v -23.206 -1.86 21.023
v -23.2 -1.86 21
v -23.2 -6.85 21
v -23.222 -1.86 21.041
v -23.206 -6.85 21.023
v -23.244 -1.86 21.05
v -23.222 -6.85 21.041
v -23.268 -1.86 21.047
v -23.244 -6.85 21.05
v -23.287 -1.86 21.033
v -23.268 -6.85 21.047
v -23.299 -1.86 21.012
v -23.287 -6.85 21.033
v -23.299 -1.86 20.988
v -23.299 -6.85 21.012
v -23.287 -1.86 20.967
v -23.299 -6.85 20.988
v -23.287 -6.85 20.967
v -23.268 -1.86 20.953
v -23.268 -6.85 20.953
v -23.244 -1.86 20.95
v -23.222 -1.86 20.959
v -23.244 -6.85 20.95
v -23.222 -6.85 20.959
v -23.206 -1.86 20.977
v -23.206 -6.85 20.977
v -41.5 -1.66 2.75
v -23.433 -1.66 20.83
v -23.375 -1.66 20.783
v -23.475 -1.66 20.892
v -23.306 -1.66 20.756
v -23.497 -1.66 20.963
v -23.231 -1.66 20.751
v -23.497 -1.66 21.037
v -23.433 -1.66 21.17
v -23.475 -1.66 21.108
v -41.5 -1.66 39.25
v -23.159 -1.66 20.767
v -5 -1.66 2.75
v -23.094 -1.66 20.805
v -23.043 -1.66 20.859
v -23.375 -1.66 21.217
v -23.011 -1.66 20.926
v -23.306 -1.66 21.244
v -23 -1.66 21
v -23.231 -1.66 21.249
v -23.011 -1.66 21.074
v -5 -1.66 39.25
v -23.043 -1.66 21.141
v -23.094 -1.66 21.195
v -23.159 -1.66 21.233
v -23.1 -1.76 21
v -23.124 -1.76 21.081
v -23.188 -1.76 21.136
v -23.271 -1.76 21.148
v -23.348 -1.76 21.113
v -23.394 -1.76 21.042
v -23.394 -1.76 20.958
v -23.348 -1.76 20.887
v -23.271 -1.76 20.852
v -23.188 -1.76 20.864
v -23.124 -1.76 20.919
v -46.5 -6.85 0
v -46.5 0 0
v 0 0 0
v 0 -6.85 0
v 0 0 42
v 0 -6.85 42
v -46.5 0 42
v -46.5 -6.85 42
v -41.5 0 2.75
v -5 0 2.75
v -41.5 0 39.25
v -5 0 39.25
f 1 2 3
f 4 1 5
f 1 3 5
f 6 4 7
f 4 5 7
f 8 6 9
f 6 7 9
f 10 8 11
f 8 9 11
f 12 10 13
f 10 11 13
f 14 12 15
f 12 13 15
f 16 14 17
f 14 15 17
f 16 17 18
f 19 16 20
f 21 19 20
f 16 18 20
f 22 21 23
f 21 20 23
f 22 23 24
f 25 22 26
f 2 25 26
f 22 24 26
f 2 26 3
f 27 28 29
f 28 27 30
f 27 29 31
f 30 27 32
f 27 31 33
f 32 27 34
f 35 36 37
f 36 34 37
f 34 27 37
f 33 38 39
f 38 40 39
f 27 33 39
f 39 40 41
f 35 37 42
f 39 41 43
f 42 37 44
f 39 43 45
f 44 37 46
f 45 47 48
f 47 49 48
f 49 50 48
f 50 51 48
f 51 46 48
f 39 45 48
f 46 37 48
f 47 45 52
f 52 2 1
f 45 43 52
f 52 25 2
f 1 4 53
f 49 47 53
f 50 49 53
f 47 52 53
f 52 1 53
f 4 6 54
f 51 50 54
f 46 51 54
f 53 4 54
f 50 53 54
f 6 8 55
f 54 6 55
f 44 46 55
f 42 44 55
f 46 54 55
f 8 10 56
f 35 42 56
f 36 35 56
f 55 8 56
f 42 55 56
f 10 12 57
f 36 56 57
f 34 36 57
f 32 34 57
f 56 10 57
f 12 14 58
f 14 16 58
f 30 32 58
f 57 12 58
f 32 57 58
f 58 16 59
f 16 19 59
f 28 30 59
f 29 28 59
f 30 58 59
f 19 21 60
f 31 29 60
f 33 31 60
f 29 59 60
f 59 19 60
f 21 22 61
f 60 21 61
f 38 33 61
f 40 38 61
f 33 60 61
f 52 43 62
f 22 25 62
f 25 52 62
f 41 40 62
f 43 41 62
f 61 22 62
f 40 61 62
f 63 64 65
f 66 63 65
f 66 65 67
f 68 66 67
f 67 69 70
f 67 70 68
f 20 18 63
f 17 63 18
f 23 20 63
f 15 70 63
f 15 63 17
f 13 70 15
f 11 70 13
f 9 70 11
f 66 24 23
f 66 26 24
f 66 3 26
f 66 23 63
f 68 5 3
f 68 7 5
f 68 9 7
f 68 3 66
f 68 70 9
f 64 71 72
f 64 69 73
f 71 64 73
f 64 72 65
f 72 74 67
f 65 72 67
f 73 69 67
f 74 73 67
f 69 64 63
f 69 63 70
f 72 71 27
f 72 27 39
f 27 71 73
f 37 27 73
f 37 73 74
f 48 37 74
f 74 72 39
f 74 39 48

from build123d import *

# Parameters (mm, degrees)
F0_W           = 46.5
F0_H           = 42
F0_W_2         = 36.5
F0_H_2         = 36.5
F1_DEPTH       = 6.85
F2_DEPTH       = 1.66
F4_D           = 0.1
F4_CSINK_D     = 0.5
F4_CSINK_ANGLE = 90


with BuildPart() as f1:
    # F0 (on Front) → F1 (new body)
    with BuildSketch(Plane.XZ):
        with Locations((-23.25, 21)):
            Rectangle(F0_W, F0_H)
        with Locations((-23.25, 21)):
            Rectangle(F0_W_2, F0_H_2, mode=Mode.SUBTRACT)
        with Locations((-23.25, 21)):
            Rectangle(F0_W_2, F0_H_2)
    extrude(amount=F1_DEPTH)

    # F0 (on Front) → F2 (cut)
    with BuildSketch(Plane.XZ):
        with Locations((-23.25, 21)):
            Rectangle(F0_W_2, F0_H_2)
    extrude(amount=F2_DEPTH, mode=Mode.SUBTRACT)

    # F4 (through all)
    with Locations(Plane(origin=(0, -1.66, 0), x_dir=(-1, 0, 0), z_dir=(0, 1, 0))):
        with Locations((23.25, 21)):
            CounterSinkHole(F4_D / 2, F4_CSINK_D / 2, counter_sink_angle=F4_CSINK_ANGLE)


solid = f1.part
